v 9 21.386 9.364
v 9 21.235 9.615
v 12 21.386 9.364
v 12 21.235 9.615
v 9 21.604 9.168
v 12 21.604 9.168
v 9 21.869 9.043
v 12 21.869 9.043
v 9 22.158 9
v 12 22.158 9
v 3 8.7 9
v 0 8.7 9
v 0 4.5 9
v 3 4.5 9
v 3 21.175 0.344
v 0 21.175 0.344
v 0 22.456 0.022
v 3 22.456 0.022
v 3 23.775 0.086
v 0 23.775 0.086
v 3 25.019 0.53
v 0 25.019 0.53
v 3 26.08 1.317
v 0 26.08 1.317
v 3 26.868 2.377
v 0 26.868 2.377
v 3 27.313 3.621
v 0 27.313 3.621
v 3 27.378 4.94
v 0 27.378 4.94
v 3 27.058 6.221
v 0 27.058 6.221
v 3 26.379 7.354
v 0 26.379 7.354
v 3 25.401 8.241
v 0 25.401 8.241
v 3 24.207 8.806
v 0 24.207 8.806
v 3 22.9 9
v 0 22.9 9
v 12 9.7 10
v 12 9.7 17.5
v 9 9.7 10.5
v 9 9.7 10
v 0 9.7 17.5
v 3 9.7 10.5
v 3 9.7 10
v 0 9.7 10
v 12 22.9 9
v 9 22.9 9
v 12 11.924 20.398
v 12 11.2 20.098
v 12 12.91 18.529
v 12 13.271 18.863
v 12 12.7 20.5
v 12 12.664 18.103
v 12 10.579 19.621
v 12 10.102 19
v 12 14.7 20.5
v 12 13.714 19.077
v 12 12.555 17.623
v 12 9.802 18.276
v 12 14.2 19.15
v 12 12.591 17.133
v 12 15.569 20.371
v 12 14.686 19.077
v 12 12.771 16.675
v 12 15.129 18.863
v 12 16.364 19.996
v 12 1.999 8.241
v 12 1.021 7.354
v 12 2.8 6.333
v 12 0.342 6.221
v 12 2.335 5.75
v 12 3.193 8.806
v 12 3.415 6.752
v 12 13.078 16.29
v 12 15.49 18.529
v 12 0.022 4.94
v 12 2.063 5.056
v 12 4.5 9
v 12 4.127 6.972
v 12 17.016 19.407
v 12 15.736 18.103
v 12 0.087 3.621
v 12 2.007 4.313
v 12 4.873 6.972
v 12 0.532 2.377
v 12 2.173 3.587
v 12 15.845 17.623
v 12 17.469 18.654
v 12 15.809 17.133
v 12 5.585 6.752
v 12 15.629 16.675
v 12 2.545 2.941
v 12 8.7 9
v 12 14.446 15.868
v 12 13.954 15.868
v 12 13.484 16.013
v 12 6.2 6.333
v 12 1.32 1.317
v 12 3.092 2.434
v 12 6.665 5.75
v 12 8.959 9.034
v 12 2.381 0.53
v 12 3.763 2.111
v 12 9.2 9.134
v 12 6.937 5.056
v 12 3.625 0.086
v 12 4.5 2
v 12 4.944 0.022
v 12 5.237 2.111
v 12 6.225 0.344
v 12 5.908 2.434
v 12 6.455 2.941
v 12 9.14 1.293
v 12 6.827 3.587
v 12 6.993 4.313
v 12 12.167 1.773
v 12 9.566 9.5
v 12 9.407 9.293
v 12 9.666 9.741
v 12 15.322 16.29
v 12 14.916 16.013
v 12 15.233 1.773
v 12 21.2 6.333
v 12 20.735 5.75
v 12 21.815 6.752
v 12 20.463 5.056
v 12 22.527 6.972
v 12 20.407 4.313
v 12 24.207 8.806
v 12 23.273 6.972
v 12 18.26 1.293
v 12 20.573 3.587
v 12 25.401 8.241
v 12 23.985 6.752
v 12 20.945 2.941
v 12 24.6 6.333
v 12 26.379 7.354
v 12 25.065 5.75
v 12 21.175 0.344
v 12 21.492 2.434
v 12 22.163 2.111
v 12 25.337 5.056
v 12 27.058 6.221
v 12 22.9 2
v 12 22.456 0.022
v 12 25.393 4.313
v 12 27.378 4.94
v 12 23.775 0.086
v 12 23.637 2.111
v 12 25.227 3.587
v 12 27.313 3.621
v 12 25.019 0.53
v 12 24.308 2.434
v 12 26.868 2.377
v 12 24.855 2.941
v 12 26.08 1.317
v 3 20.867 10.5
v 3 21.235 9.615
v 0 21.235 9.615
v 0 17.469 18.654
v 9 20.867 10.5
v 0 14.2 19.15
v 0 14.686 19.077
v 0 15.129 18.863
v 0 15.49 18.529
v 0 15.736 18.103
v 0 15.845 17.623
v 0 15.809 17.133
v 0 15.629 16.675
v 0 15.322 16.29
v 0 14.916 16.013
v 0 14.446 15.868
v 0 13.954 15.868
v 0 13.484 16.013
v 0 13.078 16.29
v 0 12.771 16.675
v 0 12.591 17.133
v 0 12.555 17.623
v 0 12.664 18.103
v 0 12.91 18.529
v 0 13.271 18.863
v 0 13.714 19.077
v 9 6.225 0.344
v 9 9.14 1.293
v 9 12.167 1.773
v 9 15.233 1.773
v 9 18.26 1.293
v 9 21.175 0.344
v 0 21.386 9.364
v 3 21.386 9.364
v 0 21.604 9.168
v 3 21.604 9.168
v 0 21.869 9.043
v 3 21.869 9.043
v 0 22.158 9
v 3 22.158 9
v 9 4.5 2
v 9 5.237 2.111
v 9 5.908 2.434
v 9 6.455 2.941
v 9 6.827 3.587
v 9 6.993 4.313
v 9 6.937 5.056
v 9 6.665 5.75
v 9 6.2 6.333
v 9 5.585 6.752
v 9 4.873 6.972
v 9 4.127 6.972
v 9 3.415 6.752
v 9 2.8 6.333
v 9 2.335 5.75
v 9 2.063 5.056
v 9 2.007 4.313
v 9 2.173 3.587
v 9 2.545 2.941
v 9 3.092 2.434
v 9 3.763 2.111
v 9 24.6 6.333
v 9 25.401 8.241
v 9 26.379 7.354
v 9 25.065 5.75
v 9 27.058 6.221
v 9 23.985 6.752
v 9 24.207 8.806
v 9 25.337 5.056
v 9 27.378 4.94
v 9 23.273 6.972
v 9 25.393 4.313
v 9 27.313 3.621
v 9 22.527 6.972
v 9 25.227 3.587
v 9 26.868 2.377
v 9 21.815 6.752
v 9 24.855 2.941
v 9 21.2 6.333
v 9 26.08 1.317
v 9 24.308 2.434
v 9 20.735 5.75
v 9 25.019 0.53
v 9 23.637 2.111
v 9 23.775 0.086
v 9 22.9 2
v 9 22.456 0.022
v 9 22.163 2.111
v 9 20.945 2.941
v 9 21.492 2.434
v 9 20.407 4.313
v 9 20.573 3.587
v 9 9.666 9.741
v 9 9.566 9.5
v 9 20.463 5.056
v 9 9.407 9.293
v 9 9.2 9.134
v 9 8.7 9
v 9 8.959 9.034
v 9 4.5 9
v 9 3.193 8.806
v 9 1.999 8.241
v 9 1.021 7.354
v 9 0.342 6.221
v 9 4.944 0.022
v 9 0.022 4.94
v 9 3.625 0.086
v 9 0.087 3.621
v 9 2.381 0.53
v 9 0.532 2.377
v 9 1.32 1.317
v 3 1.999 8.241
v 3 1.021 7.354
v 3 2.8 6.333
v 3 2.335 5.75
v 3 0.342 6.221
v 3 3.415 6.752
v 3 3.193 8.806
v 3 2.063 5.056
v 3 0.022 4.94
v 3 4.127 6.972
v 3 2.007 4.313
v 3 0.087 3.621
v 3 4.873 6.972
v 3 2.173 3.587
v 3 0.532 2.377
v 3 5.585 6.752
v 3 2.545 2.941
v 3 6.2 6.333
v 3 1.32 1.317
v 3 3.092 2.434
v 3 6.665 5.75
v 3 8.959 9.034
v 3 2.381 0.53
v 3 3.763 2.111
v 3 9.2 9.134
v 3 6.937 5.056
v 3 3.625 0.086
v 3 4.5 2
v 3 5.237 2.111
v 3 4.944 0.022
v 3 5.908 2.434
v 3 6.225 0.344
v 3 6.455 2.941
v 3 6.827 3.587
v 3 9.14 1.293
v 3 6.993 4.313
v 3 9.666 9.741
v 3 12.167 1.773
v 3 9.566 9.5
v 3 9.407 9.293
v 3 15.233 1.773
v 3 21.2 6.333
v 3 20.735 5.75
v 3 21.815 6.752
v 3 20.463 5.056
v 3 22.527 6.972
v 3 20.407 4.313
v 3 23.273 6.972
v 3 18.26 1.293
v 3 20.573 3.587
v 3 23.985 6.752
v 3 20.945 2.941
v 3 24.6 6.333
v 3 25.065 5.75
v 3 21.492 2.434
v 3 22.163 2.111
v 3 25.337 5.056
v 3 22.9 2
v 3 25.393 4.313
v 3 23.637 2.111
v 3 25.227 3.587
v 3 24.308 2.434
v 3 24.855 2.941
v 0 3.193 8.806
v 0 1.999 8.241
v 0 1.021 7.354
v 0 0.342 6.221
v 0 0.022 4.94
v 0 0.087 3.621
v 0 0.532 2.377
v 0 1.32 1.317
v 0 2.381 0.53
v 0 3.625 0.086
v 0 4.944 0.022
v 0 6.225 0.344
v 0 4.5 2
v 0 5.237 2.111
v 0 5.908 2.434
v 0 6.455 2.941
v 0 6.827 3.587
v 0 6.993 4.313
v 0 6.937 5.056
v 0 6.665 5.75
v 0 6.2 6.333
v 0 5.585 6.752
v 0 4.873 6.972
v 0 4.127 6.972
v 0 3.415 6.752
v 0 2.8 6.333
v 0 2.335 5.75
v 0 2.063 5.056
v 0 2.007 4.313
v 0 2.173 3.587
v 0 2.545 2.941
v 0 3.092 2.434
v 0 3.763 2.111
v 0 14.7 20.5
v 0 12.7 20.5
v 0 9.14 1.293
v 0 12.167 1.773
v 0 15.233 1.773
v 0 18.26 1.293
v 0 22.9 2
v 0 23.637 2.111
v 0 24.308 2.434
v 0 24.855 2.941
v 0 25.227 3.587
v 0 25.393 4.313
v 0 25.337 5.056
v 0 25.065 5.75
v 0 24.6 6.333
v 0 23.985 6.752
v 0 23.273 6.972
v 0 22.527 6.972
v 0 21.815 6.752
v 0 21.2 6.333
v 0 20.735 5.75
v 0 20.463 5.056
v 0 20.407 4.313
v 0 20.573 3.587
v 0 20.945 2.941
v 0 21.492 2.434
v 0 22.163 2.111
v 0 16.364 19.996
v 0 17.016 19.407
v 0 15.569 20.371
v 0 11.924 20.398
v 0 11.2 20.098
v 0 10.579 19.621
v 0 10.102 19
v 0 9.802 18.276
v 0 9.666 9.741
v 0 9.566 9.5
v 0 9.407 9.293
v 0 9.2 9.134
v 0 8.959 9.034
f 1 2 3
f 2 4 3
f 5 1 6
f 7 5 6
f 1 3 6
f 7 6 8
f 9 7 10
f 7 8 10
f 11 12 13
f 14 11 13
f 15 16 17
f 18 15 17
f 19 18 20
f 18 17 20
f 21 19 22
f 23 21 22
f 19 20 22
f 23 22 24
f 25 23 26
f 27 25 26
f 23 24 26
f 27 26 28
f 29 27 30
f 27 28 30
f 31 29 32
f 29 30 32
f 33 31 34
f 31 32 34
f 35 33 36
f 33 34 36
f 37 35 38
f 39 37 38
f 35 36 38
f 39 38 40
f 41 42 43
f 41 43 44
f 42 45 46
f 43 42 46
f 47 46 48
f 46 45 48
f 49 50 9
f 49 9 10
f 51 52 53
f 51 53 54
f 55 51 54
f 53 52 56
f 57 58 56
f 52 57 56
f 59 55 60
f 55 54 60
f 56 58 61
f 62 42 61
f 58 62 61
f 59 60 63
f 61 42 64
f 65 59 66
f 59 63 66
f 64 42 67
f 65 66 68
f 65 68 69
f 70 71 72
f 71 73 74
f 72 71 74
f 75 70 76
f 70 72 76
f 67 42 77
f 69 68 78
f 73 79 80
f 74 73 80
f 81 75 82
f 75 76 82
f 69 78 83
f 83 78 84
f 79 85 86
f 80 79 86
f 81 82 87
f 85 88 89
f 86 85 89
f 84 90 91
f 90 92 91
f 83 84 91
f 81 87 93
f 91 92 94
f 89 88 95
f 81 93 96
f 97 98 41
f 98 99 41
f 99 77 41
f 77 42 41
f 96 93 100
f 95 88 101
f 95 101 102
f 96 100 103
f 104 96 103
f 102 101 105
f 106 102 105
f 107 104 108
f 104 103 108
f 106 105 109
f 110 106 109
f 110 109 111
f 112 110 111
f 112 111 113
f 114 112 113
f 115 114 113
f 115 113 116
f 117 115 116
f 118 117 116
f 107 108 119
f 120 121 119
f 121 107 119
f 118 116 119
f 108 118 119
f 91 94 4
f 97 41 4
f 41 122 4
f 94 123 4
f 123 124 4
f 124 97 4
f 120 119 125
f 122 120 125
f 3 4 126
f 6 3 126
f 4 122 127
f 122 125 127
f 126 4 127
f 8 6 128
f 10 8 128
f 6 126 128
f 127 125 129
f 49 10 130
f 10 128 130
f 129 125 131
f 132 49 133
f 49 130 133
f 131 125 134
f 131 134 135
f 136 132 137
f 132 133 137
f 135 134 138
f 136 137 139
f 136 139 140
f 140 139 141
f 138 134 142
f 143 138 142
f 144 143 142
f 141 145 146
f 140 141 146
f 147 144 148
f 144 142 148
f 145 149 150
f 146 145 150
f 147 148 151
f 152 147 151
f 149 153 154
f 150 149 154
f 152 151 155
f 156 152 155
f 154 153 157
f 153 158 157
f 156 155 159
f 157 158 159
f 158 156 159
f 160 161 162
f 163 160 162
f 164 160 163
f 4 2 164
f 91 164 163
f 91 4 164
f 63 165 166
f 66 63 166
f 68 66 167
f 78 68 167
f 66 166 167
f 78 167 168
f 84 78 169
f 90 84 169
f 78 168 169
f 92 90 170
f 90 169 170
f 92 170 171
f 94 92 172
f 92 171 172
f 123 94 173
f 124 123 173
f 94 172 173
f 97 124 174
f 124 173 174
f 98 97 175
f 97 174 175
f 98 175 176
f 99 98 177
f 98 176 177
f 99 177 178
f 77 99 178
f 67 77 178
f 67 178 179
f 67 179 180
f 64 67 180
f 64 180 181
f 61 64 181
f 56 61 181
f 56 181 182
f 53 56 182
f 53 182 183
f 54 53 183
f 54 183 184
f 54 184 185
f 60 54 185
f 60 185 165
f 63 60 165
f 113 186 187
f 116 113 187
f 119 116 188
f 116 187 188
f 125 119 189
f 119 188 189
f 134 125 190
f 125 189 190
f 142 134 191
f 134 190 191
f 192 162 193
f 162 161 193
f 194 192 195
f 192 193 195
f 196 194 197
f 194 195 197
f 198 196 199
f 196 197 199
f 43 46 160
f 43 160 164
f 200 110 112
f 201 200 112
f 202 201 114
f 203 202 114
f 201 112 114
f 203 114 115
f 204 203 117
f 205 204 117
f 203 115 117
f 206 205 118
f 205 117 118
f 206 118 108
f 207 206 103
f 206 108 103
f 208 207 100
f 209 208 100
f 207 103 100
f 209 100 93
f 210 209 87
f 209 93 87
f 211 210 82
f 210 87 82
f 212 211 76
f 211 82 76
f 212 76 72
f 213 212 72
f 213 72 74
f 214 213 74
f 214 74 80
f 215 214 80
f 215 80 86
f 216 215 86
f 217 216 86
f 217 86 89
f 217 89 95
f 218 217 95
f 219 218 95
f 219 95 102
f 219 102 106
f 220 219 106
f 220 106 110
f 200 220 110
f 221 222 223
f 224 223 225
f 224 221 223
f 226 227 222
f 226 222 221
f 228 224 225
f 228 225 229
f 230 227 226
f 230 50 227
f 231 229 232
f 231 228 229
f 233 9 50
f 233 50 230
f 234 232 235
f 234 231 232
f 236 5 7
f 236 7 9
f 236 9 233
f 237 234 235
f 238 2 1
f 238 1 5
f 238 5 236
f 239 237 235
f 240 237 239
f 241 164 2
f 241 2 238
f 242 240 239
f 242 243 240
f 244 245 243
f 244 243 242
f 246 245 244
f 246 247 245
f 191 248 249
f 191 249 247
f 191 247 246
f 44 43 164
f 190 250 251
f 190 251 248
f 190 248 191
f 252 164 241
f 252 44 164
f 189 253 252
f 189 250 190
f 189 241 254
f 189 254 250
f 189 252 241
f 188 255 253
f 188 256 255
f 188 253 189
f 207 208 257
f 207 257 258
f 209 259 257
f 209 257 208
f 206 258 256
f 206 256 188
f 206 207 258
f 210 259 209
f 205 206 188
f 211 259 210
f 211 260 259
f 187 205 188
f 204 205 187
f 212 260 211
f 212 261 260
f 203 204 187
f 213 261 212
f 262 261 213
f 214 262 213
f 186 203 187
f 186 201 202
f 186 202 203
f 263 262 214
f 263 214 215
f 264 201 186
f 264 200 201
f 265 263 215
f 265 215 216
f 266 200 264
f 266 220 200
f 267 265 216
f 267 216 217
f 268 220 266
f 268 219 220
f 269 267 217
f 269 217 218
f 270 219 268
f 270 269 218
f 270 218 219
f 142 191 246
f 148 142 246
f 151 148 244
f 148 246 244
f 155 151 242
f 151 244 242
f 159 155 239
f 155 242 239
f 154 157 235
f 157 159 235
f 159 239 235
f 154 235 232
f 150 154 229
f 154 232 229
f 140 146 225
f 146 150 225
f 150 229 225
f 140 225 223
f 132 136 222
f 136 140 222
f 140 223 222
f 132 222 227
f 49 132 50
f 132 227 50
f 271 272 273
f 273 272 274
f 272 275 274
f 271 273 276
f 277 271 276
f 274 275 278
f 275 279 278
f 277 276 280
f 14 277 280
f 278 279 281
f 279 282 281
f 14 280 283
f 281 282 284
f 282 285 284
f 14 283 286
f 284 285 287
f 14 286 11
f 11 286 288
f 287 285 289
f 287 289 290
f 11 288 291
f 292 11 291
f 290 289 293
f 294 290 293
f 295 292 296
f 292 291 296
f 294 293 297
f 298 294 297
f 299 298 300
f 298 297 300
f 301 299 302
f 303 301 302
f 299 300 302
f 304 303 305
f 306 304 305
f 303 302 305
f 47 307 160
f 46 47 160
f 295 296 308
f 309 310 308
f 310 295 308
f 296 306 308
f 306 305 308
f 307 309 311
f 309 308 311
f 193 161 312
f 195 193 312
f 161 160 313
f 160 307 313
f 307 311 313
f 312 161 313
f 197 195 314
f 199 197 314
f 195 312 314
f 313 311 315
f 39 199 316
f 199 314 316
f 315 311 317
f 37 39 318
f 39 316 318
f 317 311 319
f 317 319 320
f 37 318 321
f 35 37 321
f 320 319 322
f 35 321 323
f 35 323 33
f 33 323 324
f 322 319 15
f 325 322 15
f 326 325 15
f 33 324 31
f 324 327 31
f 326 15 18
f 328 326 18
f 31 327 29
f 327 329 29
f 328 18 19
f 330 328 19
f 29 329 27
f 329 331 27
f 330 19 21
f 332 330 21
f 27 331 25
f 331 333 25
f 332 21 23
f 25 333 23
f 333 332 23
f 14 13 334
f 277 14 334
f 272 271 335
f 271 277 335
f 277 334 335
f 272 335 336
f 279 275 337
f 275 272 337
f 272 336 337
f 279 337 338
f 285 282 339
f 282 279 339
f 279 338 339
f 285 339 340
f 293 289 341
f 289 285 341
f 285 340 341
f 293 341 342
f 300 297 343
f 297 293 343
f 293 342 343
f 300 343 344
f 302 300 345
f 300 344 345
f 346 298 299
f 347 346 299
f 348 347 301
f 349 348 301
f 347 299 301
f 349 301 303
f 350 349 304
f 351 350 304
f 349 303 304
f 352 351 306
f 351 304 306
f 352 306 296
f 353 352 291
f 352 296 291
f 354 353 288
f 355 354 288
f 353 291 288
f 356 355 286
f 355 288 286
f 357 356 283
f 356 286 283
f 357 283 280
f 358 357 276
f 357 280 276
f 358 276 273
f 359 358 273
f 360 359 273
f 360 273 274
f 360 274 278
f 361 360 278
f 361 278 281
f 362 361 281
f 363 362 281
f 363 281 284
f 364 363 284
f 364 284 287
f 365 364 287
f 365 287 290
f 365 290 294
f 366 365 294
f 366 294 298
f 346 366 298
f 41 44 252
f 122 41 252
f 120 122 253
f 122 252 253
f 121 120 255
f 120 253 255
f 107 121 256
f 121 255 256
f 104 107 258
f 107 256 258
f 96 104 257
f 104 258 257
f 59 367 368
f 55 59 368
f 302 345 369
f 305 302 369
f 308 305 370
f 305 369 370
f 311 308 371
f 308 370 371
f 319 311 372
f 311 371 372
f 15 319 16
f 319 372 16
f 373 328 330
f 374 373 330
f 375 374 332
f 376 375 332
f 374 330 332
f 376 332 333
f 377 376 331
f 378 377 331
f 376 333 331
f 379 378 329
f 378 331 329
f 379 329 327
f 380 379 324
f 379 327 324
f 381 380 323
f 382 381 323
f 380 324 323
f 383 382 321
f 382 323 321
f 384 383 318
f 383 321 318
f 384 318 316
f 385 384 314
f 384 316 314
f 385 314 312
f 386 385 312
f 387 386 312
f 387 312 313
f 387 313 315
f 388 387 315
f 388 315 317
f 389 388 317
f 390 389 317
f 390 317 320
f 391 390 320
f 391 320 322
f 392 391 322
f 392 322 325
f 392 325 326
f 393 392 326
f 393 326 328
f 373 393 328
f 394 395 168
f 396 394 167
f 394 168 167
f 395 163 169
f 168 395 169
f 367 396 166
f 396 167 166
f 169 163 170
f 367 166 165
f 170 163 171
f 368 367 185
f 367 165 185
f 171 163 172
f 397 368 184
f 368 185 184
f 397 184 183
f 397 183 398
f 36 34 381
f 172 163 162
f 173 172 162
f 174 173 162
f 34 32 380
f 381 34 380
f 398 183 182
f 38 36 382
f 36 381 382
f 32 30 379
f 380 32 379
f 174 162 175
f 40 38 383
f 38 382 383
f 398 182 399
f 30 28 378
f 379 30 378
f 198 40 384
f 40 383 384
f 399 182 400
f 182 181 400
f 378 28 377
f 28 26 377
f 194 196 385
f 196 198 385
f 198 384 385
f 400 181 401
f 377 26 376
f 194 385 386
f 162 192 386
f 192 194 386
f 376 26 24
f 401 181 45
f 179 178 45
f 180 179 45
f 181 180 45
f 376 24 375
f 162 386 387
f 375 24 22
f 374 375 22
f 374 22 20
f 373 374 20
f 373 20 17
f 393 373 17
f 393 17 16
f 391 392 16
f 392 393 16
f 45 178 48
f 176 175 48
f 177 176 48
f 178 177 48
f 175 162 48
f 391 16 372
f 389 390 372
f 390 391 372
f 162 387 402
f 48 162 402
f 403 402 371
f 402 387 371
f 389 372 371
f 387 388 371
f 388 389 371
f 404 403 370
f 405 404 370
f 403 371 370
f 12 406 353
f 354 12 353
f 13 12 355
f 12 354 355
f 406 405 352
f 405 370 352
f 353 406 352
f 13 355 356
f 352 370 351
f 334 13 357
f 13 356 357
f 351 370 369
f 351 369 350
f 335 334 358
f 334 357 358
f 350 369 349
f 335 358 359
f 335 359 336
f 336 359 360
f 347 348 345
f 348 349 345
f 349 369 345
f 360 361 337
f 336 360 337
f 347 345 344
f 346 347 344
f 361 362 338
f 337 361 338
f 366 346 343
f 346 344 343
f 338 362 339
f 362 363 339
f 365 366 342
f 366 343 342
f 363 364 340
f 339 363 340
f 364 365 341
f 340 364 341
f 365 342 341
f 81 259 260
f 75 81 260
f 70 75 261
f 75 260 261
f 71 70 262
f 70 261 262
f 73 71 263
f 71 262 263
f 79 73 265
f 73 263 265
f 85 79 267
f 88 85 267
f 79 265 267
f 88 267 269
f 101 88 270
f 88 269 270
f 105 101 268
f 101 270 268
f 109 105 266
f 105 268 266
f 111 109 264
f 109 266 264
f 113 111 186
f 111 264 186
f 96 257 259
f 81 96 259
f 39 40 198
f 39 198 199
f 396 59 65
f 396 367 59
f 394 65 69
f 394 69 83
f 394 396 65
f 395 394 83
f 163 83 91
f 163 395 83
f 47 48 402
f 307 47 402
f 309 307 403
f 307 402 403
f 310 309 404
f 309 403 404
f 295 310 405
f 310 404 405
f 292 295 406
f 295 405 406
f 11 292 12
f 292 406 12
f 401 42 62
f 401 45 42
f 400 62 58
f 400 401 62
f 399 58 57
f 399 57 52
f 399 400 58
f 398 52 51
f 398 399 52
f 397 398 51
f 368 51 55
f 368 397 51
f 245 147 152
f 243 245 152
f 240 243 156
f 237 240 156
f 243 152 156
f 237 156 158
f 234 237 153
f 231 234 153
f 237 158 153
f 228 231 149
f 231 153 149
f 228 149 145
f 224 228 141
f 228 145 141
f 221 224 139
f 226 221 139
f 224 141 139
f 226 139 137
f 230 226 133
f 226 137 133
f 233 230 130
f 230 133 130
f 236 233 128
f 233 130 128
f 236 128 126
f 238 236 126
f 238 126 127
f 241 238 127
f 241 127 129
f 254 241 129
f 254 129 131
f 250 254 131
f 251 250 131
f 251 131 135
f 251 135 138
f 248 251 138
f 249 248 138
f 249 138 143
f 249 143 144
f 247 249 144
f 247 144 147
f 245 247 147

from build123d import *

# Parameters (mm, degrees)
EXTRUDE_1_DEPTH     = 22
SKETCH_2_W          = 32.061557032
SKETCH_2_H          = 43.504749412
CUT_EXTRUDE_1_DEPTH = 16
SKETCH_3_W          = 6
SKETCH_3_H          = 10.337049688
CUT_EXTRUDE_2_DEPTH = 30
SKETCH_9_R          = 2.5
CUT_EXTRUDE_4_DEPTH = 37.263066611
HOLE_WIZARD_M4_1_D  = 3.3
CHAMFER_1_SIZE      = 12
CHAMFER_1_SIZE_2    = 5
FILLET_2_R          = 3
FILLET_3_R          = 3
FILLET_4_R          = 1


with BuildPart() as part:
    # 草圖1 → 填料-伸長1 (new body)
    with BuildSketch(Plane.XY):
        Polygon((0, 0), (3, 0), (3, 9.7), (9, 9.7), (9, 0), (12, 0), (12, 27.4), (9, 27.4), (9, 21.7), (3, 21.7), (3, 27.4), (0, 27.4), align=None)
    extrude(amount=EXTRUDE_1_DEPTH)

    # 草圖2 → 除料-伸長1 (cut)
    with BuildSketch(Plane(origin=(0, 0, 0), x_dir=(0, 0, -1), z_dir=(1, 0, 0))):
        with Locations((-6.749670429, 14.217142955)):
            Rectangle(SKETCH_2_W, SKETCH_2_H)
        with BuildLine():
            Line((-20.5, 9.7), (-10, 9.7))
            ThreePointArc((-10, 9.7), (-9.292893219, 9.407106781), (-9, 8.7))
            Line((-9, 8.7), (-9, 4.5))
            ThreePointArc((-9, 4.5), (-3.620541034, 0.086775337), (-0.343754699, 6.225))
            ThreePointArc((-0.343754699, 6.225), (-1.833358396, 13.7), (-0.343754699, 21.175))
            ThreePointArc((-0.343754699, 21.175), (-3.620541034, 27.313224663), (-9, 22.9))
            Line((-9, 22.9), (-9, 21.7))
            Line((-9, 21.7), (-20.5, 21.7))
            Line((-20.5, 21.7), (-20.5, 9.7))
        make_face(mode=Mode.SUBTRACT)
    extrude(amount=CUT_EXTRUDE_1_DEPTH, mode=Mode.SUBTRACT)

    # 草圖3 → 除料-伸長2 (cut)
    with BuildSketch(Plane(origin=(0, 0, 0), x_dir=(1, 0, 0), z_dir=(0, 1, 0))):
        with Locations((6, -5.331475156)):
            Rectangle(SKETCH_3_W, SKETCH_3_H)
    extrude(amount=CUT_EXTRUDE_2_DEPTH, mode=Mode.SUBTRACT)

    # 草圖9 → 除料-伸長4 (cut, through all)
    with BuildSketch(Plane(origin=(12, 0, 0), x_dir=(0, 0, -1), z_dir=(1, 0, 0))):
        with Locations((-4.5, 4.5)):
            Circle(SKETCH_9_R)
        with Locations((-4.5, 22.9)):
            Circle(SKETCH_9_R)
    extrude(amount=-CUT_EXTRUDE_4_DEPTH, mode=Mode.SUBTRACT)

    # M4 螺紋孔1 (through all)
    with Locations(Plane(origin=(12, 0, 0), x_dir=(0, 0, -1), z_dir=(1, 0, 0))):
        with Locations((-17.5, 14.2)):
            Hole(HOLE_WIZARD_M4_1_D / 2)

    # 導角1
    # the kernel refuses this chamfer: 12, 5 mm, written as the material it takes off along each edge
    with BuildSketch(Plane(origin=(43.111115995, 21.7, 20.5), x_dir=(0, 0.014835162506254055, -0.9998899529215268), z_dir=(-1, 0, 0))) as chamfer_1_piece_1_section:
        Polygon((CHAMFER_1_SIZE * 0.999889952922, CHAMFER_1_SIZE * 0.0148351625063), (-CHAMFER_1_SIZE_2 * 0.0148351625063, CHAMFER_1_SIZE_2 * 0.999889952922), (0, 0), align=None)
    chamfer_1_piece_1 = extrude(amount=74.22223199, mode=Mode.PRIVATE)
    chamfer_1_piece_1 = split(chamfer_1_piece_1, bisect_by=Plane(origin=(10.5, 21.408333333, 9), z_dir=(0, 0, 1)), keep=Keep.TOP, mode=Mode.PRIVATE)
    add(chamfer_1_piece_1, mode=Mode.SUBTRACT)

    # 圓角2
    fillet_2_edges = [part.edges().sort_by_distance(p)[0] for p in [
        (6, 9.7, 20.5),
    ]]
    fillet(fillet_2_edges, radius=FILLET_2_R)

    # 圓角3
    fillet_3_edges = [part.edges().sort_by_distance(p)[0] for p in [
        (6, 16.7, 20.5),
    ]]
    fillet(fillet_3_edges, radius=FILLET_3_R)

    # 圓角4
    fillet_4_edges = [part.edges().sort_by_distance(p)[0] for p in [
        (1.5, 21.491666667, 9),
        (10.5, 21.491666667, 9),
    ]]
    fillet(fillet_4_edges, radius=FILLET_4_R)


solid = part.part
